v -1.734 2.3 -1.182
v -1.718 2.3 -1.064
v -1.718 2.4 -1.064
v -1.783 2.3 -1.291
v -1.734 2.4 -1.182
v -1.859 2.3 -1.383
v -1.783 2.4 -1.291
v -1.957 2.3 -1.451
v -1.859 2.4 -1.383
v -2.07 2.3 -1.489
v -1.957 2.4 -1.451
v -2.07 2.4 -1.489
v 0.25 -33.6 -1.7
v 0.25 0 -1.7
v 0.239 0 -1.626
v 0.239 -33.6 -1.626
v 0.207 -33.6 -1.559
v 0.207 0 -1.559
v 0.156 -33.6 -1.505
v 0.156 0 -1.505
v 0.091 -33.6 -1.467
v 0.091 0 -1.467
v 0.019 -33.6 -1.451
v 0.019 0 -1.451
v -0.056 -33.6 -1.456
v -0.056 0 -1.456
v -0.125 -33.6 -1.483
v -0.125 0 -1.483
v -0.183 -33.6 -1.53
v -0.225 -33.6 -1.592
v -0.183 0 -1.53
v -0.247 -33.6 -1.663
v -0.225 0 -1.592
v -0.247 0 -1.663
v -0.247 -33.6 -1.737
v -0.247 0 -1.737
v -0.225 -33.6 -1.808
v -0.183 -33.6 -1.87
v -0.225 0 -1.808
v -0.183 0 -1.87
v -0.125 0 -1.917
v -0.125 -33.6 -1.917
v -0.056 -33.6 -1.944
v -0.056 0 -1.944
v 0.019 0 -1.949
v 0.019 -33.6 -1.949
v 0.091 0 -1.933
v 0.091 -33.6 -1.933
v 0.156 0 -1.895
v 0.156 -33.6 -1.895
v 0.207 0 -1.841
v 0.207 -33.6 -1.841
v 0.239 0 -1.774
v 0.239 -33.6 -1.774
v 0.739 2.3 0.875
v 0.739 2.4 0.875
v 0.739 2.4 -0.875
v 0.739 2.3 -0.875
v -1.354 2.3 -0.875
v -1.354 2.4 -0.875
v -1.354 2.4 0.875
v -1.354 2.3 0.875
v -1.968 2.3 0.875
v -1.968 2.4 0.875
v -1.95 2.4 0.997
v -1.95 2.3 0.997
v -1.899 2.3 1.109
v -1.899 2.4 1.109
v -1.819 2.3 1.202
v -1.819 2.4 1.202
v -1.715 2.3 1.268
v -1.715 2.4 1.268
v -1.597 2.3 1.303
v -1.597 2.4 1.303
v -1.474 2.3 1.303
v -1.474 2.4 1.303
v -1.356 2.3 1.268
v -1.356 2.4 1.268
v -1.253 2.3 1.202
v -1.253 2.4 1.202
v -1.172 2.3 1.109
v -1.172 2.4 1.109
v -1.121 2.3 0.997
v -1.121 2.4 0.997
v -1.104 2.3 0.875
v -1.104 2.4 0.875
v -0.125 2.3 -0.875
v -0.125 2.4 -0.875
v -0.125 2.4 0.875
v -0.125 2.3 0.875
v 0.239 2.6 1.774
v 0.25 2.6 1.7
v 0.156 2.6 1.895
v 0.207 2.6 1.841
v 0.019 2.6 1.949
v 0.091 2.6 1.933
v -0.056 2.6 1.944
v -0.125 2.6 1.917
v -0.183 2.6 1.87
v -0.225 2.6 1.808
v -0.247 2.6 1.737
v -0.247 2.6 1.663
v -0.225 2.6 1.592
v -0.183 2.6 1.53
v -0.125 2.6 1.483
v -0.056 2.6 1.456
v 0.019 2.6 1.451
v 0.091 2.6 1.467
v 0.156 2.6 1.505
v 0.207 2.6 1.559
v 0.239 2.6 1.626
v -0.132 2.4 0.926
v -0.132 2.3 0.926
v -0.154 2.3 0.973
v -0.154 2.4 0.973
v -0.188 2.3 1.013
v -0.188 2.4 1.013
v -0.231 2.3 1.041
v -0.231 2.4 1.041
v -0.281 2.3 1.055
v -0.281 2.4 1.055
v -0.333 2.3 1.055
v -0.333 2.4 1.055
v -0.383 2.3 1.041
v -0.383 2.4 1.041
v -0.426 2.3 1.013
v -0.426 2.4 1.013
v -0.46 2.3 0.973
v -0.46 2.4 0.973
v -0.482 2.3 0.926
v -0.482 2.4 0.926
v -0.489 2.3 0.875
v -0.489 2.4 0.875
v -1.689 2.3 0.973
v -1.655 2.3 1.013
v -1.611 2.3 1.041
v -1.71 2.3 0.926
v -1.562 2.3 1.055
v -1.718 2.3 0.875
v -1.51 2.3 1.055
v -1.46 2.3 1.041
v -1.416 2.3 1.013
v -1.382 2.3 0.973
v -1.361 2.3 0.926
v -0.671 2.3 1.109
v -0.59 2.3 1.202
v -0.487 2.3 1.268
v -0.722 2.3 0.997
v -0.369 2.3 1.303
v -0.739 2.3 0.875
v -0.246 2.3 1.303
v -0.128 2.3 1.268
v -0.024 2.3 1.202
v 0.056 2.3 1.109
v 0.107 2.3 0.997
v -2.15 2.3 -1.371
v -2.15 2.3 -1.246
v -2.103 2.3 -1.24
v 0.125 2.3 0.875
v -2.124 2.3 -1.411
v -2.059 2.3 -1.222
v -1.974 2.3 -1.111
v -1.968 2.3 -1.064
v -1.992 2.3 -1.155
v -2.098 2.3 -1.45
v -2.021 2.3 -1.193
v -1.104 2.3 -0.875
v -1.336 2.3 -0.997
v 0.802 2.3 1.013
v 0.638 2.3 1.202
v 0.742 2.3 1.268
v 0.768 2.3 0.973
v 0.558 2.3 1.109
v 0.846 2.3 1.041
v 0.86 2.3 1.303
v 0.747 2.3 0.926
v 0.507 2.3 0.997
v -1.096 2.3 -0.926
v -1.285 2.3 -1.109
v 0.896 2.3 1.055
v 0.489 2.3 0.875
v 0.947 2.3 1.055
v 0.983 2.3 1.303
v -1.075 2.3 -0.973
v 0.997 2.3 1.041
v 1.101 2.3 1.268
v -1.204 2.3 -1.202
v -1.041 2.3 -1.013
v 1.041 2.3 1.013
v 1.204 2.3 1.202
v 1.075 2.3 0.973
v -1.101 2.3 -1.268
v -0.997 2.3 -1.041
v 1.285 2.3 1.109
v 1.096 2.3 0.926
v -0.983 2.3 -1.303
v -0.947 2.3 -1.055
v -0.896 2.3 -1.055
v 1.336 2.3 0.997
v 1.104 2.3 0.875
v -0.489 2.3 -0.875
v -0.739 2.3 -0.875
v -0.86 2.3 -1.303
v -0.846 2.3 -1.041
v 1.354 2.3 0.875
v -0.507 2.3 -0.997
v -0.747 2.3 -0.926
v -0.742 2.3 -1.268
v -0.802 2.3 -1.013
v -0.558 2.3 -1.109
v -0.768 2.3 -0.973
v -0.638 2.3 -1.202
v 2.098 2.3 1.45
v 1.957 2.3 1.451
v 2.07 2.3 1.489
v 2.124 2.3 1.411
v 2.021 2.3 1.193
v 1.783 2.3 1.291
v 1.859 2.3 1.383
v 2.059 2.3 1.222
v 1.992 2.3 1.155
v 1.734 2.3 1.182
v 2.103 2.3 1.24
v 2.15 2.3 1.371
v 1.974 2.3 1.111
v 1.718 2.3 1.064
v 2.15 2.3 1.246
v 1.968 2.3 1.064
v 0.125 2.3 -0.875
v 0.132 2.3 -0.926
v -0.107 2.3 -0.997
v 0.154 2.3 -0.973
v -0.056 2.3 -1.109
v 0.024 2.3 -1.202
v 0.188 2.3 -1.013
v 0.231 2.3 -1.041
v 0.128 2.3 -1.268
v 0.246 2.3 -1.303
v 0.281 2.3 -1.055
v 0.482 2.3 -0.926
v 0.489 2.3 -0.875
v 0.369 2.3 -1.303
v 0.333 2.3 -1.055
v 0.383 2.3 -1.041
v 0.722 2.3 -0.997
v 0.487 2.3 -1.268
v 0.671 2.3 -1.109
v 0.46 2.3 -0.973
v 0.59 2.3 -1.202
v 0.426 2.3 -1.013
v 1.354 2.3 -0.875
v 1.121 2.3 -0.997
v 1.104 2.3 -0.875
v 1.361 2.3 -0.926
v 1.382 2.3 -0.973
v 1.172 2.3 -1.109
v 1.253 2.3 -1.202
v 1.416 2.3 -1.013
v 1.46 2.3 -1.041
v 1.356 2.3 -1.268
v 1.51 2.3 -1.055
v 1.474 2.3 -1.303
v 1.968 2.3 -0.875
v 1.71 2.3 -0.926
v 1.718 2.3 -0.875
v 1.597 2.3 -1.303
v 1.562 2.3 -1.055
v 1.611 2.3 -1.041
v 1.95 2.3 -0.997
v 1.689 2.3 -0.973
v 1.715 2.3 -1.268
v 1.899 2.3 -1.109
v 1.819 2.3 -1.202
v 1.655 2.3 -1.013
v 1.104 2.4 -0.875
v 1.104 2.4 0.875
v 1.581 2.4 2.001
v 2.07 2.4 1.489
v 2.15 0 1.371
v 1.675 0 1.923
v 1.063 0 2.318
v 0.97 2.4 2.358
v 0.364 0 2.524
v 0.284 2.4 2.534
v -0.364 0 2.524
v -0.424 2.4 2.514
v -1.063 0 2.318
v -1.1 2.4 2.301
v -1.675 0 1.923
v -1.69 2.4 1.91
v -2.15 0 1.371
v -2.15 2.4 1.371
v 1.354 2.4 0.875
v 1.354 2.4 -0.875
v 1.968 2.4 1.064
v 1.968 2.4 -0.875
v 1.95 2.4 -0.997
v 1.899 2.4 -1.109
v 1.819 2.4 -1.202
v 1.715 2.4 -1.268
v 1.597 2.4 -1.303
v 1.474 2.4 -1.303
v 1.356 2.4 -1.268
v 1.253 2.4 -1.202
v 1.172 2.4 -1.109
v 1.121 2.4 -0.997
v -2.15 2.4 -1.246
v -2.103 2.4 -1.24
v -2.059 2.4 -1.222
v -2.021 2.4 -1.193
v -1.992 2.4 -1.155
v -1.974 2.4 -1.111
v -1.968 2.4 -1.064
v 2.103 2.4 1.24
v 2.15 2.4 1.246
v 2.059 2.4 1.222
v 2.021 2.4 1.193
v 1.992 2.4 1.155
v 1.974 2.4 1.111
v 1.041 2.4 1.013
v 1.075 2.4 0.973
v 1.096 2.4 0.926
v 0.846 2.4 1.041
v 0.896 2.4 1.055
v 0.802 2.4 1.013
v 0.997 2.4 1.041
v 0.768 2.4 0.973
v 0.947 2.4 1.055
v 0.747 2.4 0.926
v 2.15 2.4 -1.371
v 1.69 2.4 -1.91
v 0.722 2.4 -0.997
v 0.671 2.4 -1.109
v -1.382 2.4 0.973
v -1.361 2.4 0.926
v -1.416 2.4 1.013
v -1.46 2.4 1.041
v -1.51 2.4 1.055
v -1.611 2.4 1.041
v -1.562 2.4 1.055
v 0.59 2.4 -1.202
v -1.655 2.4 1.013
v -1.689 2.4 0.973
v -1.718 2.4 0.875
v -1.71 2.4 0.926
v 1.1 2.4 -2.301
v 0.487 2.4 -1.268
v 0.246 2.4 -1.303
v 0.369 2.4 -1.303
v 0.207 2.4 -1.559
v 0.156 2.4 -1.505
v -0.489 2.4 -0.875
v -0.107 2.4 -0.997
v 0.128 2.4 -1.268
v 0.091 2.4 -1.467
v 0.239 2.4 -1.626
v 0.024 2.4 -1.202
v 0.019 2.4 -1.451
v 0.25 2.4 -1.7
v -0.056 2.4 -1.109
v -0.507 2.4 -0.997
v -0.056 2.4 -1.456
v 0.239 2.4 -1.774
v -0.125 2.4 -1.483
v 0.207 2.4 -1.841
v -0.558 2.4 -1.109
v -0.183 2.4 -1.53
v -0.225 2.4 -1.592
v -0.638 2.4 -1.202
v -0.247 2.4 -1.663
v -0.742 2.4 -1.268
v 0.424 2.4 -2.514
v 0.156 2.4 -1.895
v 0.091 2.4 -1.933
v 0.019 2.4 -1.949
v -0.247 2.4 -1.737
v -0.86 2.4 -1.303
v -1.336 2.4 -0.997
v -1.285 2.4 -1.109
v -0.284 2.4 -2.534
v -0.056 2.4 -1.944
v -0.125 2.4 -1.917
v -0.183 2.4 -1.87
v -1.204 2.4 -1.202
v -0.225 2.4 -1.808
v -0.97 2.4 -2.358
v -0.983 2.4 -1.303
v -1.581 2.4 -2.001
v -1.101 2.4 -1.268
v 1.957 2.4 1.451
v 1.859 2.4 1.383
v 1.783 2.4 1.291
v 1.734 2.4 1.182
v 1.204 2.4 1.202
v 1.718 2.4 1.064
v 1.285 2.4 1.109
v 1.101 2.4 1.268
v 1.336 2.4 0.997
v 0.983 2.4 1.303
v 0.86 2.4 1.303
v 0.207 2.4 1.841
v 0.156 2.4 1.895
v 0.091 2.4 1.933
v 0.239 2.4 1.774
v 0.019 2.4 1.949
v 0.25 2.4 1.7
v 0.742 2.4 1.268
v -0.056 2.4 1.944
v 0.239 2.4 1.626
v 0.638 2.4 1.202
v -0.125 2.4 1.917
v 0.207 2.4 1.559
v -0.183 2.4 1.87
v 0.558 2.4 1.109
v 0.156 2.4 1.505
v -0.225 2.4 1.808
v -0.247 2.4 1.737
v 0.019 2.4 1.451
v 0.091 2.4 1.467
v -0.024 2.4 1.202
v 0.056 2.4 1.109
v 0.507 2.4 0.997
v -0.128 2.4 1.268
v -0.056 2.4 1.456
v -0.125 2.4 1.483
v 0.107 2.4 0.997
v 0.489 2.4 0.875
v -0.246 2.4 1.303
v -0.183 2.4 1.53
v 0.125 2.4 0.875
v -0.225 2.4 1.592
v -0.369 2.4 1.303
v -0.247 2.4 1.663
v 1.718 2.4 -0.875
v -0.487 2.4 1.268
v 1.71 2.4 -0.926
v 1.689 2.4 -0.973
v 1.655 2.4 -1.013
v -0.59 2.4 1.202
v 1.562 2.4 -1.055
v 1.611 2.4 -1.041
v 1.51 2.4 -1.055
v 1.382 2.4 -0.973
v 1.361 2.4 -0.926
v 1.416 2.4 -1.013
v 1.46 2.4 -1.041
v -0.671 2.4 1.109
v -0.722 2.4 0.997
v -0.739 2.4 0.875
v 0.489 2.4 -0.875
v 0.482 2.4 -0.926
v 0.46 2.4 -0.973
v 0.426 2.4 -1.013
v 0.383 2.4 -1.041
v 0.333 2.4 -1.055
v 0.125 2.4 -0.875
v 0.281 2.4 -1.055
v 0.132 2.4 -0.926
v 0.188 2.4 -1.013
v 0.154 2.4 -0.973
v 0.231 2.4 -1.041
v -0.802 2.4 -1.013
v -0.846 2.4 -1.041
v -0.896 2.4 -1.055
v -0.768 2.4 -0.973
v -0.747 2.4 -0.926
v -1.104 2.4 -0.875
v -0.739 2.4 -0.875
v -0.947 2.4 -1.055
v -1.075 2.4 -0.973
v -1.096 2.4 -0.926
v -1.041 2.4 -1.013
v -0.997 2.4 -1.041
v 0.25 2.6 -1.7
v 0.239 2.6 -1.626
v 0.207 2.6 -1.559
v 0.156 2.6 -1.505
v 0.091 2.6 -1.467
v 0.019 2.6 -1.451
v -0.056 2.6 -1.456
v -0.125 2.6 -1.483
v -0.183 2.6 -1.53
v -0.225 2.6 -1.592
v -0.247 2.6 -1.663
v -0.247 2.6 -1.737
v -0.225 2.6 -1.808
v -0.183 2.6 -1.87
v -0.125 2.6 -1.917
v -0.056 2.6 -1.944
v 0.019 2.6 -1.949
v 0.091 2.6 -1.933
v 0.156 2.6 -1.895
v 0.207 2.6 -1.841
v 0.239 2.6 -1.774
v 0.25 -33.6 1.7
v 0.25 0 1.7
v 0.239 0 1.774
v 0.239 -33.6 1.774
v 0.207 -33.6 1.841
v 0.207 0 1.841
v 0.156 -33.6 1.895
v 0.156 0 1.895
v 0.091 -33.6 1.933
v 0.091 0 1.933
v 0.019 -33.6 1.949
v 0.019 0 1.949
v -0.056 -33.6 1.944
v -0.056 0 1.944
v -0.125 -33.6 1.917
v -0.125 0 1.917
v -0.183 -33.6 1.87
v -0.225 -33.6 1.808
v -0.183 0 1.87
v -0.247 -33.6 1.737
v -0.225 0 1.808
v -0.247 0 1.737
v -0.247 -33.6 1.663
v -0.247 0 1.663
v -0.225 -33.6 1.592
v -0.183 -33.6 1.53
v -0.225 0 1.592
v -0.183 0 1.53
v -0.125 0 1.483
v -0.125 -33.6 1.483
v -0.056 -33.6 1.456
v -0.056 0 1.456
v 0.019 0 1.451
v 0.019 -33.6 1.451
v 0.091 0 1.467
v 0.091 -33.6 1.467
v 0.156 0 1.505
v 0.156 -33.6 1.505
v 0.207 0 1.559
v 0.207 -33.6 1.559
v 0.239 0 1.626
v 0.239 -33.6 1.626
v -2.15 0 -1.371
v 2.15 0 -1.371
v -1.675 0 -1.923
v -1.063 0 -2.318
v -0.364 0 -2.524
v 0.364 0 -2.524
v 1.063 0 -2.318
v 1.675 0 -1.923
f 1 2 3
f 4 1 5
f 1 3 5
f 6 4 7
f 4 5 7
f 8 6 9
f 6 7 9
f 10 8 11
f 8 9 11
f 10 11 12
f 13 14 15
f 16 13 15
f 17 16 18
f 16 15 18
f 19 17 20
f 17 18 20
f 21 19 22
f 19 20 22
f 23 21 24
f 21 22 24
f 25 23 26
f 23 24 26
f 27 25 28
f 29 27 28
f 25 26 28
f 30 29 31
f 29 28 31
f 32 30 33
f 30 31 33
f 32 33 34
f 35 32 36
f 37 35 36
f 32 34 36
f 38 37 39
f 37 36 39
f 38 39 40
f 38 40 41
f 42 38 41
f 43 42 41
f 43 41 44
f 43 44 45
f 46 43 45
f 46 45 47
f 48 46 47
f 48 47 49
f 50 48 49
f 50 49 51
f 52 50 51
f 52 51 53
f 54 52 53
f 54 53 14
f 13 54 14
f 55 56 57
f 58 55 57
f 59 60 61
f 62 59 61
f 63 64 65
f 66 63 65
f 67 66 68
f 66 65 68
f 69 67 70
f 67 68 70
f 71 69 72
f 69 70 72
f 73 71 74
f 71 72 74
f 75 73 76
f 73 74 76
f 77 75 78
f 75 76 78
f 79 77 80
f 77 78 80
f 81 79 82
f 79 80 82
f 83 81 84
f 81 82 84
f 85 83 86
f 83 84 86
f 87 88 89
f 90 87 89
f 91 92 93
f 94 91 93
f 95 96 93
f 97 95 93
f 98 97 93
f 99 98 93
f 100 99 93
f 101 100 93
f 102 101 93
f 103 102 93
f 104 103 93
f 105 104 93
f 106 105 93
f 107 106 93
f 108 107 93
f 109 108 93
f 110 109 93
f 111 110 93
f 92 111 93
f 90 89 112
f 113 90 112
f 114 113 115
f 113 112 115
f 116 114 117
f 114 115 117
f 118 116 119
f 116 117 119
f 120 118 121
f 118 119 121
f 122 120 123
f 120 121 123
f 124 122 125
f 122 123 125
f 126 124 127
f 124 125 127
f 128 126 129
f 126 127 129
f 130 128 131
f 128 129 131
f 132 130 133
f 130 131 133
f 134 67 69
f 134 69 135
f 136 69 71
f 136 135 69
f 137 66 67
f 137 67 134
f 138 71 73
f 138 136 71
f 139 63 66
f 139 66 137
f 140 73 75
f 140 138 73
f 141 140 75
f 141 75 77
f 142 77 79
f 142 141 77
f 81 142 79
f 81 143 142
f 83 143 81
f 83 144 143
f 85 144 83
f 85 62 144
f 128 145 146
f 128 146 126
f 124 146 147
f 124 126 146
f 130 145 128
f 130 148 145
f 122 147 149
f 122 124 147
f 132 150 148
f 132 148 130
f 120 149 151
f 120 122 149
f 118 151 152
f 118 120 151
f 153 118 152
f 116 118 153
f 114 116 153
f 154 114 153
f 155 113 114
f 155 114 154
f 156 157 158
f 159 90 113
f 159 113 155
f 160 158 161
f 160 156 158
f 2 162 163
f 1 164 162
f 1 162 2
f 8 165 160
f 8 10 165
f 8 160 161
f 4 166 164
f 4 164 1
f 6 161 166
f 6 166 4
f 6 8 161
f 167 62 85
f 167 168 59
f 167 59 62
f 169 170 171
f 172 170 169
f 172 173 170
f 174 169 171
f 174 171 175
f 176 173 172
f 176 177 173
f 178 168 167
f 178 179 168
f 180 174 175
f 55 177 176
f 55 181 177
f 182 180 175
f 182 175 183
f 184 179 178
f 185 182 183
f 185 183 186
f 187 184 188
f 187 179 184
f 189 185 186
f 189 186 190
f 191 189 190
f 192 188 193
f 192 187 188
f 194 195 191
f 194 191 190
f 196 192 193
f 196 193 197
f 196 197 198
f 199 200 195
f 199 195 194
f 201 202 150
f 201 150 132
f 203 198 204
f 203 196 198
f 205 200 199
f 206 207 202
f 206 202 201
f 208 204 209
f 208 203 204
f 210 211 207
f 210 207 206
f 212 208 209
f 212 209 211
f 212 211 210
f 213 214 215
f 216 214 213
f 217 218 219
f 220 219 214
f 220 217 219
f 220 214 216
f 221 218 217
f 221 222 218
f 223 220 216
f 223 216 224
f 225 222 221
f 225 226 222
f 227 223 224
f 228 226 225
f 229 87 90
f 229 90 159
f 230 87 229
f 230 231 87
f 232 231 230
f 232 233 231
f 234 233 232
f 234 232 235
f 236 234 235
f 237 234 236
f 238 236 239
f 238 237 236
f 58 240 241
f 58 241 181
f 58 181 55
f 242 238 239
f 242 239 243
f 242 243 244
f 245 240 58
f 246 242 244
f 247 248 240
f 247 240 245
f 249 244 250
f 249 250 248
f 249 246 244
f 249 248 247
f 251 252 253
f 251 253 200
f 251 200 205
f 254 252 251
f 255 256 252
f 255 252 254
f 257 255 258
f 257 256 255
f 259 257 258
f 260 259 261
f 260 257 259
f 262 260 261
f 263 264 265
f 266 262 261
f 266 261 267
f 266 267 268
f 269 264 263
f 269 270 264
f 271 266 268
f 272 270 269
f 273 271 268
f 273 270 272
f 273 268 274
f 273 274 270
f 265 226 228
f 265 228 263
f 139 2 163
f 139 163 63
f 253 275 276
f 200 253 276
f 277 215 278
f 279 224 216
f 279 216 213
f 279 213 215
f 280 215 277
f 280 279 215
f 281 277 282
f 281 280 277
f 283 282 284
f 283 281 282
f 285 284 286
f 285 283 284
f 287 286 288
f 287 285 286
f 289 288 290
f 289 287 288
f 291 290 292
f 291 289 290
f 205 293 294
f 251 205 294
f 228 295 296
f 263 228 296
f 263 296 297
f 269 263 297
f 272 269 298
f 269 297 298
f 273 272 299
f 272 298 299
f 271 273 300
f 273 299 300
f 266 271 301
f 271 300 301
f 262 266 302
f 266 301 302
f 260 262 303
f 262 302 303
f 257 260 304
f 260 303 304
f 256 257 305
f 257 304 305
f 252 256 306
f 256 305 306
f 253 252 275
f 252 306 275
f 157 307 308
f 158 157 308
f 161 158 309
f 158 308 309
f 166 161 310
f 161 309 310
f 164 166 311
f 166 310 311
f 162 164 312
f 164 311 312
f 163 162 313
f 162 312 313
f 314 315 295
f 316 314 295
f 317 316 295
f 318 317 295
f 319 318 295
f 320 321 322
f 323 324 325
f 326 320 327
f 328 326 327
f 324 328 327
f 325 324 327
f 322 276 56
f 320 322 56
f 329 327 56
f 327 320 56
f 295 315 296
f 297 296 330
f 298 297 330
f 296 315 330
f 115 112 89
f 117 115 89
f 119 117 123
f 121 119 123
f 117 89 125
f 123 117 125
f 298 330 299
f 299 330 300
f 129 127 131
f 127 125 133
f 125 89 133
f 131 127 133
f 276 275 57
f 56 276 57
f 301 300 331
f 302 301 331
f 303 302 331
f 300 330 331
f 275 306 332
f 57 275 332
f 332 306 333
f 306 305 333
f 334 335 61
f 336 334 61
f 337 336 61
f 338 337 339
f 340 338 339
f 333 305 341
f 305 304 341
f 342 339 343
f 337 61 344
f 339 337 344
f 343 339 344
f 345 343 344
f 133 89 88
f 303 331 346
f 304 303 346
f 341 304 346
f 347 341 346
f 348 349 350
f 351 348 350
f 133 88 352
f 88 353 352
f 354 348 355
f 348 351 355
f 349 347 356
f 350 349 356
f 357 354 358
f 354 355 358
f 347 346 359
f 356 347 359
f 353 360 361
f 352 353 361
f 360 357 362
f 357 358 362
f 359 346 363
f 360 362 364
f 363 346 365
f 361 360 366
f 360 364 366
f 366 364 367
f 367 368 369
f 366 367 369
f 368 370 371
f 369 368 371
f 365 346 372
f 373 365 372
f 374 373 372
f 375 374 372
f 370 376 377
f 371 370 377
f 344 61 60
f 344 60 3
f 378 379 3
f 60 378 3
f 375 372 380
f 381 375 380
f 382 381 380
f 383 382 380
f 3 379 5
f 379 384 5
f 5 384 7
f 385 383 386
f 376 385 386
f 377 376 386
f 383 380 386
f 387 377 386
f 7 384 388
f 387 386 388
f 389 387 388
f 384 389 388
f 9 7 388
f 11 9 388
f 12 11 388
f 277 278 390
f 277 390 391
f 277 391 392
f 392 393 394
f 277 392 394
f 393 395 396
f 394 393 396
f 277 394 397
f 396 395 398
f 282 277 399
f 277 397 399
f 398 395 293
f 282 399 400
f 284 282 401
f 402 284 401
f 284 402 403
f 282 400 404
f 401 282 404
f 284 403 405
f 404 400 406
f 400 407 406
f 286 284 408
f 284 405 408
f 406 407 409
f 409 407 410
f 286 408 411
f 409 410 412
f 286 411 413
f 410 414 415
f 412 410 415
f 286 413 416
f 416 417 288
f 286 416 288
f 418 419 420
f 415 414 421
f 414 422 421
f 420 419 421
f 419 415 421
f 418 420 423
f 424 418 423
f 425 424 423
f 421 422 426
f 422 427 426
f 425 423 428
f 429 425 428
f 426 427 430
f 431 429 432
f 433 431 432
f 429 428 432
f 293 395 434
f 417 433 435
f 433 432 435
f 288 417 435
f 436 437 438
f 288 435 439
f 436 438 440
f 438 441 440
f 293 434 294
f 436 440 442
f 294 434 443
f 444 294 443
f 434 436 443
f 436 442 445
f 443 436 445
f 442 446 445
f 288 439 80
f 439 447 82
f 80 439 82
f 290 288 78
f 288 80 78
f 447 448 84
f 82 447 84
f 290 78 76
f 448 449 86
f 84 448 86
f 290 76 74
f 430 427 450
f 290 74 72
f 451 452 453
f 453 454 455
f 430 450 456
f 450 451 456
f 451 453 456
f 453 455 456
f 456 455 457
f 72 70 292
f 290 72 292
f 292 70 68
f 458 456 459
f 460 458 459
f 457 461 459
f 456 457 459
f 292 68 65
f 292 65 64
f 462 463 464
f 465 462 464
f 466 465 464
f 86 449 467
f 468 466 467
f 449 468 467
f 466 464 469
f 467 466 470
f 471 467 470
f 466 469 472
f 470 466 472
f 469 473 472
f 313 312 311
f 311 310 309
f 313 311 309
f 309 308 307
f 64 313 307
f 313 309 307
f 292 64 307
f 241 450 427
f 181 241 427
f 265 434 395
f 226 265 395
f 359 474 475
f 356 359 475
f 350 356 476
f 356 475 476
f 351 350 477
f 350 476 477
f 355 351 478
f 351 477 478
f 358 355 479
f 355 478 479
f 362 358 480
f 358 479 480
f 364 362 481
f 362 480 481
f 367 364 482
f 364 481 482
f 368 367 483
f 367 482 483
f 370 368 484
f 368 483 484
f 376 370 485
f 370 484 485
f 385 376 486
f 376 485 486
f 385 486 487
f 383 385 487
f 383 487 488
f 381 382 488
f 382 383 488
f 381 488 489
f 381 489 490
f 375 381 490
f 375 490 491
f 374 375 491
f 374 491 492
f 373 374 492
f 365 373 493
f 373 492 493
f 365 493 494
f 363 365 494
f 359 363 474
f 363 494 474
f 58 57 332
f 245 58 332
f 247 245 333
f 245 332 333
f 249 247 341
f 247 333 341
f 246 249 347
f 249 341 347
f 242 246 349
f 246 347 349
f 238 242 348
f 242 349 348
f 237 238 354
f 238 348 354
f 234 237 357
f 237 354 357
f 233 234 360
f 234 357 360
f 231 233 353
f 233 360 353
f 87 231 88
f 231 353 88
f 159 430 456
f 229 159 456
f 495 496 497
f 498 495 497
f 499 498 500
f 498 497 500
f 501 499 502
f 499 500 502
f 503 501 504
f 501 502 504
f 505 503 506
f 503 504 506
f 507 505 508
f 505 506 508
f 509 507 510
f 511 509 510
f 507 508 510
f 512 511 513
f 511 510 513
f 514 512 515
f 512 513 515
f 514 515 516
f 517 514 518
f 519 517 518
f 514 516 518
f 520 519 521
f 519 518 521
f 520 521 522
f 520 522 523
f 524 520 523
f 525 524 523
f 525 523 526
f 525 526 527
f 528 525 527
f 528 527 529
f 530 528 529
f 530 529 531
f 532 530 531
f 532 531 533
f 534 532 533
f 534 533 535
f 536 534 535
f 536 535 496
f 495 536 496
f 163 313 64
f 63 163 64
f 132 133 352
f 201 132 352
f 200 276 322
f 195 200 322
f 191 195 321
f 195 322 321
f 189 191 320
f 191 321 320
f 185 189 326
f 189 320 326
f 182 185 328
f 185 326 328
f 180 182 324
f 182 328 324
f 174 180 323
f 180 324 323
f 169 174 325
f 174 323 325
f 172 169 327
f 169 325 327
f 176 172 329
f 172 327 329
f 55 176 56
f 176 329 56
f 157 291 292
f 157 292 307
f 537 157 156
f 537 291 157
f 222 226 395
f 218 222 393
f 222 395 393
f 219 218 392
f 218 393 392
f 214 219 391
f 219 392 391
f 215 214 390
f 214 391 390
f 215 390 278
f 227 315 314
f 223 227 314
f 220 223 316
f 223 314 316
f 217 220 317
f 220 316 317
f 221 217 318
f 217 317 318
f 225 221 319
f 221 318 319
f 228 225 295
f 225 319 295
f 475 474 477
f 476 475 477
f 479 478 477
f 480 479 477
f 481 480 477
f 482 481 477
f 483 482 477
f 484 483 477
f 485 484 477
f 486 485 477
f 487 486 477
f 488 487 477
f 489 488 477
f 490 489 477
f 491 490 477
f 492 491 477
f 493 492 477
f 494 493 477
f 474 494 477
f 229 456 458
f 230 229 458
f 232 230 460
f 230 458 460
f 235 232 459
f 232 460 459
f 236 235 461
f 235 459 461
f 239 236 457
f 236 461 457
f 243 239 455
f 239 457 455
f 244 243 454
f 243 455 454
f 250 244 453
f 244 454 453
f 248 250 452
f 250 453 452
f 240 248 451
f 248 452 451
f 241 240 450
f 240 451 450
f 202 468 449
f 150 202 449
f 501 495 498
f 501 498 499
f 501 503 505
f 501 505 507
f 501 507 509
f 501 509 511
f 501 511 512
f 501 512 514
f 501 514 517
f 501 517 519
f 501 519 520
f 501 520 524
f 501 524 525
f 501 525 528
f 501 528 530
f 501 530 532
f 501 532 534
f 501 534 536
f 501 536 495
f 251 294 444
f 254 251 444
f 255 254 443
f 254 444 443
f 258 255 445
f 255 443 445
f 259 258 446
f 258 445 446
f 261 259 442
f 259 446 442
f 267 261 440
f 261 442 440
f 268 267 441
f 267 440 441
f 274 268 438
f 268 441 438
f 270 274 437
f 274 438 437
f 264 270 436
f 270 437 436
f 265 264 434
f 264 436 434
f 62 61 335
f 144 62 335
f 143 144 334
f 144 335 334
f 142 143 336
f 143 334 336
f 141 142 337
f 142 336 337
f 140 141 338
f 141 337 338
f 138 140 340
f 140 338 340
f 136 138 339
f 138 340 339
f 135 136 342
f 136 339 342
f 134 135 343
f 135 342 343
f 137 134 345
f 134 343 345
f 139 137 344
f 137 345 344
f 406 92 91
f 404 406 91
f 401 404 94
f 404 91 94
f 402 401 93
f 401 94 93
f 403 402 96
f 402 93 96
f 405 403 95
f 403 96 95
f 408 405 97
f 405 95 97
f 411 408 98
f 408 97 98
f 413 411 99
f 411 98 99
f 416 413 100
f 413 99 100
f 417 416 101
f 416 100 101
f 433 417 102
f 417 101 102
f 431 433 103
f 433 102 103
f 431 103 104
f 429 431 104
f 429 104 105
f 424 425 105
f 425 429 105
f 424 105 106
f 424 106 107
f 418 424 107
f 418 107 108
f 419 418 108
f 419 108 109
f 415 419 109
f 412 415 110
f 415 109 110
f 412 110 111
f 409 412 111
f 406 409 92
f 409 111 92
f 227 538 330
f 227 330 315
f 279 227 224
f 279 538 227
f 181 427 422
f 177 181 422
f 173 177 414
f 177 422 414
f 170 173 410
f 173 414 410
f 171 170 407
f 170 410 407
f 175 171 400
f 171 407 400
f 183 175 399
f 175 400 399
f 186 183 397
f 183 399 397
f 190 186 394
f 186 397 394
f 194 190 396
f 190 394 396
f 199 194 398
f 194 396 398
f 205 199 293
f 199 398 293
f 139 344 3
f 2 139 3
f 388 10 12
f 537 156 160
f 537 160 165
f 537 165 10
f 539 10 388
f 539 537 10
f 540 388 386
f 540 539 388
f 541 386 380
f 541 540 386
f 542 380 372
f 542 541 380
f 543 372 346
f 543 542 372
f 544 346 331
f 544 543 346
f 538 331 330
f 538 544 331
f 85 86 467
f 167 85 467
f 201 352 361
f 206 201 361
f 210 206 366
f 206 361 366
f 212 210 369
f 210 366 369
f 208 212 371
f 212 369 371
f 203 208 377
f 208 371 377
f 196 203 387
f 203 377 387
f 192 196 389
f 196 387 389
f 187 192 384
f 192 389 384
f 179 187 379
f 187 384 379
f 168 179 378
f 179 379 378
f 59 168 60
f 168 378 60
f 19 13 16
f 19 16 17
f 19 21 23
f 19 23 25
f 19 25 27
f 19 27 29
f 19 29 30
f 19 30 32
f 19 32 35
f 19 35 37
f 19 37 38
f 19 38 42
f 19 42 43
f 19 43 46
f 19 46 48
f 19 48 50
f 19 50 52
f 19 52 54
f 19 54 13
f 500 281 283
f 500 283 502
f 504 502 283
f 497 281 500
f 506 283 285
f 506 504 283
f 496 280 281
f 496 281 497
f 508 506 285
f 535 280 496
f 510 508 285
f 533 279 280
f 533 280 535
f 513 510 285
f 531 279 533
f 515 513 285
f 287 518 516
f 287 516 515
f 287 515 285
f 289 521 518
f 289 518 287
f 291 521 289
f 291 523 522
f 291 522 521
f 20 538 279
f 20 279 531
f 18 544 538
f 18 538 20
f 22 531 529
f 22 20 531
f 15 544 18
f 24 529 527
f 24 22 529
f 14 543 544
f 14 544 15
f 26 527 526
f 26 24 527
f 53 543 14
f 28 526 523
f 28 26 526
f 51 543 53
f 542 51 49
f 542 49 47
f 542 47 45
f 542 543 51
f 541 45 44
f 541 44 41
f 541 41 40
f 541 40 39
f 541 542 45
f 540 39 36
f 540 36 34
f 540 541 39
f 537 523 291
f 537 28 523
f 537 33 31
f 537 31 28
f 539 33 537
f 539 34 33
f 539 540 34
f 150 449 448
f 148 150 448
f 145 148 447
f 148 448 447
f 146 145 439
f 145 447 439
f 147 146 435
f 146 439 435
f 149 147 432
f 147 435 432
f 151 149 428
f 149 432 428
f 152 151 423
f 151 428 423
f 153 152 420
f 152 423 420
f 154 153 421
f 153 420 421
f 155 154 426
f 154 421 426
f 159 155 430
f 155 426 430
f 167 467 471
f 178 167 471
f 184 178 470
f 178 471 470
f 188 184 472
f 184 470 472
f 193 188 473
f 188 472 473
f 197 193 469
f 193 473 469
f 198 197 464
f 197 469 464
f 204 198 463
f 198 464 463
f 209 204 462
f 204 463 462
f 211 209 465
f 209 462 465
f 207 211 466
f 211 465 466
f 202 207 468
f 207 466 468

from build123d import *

# Parameters (mm, degrees)
BOSS_EXTRUDE1_DEPTH     = 2.4
BOSS_EXTRUDE2_START     = -2.6
SKETCH2_R               = 0.25
BOSS_EXTRUDE2_DEPTH     = 36.2
CUT_EXTRUDE_THIN1_DEPTH = 0.1


with BuildPart() as part:
    # Sketch1 → Boss-Extrude1 (new body)
    with BuildSketch(Plane(origin=(0, 0, 0), x_dir=(1, 0, 0), z_dir=(0, 1, 0))):
        with BuildLine():
            Line((2.15, 1.37113092), (2.15, -1.37113092))
            ThreePointArc((2.15, -1.37113092), (0, -2.55), (-2.15, -1.37113092))
            Line((-2.15, -1.37113092), (-2.15, 1.37113092))
            ThreePointArc((-2.15, 1.37113092), (0, 2.55), (2.15, 1.37113092))
        make_face()
    extrude(amount=BOSS_EXTRUDE1_DEPTH)

    # Sketch2 → Boss-Extrude2 (add)
    with BuildSketch(Plane.XZ.offset(BOSS_EXTRUDE2_START)):
        with Locations((0, 1.7)):
            Circle(SKETCH2_R)
        with Locations((0, -1.7)):
            Circle(SKETCH2_R)
    extrude(amount=BOSS_EXTRUDE2_DEPTH)

    # Sketch3 → Cut-Extrude-Thin1 (cut)
    with BuildSketch(Plane(origin=(0, 2.4, 0), x_dir=(1, 0, 0), z_dir=(0, 1, 0))):
        with BuildLine():
            ThreePointArc((-2.15, 1.24613092), (-2.021205551, 1.192782512), (-1.967857143, 1.063988063))
            Line((-1.967857143, 1.063988063), (-1.967857143, -0.875))
            ThreePointArc((-1.967857143, -0.875), (-1.535714286, -1.307142857), (-1.103571429, -0.875))
            Line((-1.103571429, -0.875), (-1.103571429, 0.875))
            ThreePointArc((-1.103571429, 0.875), (-0.921428571, 1.057142857), (-0.739285714, 0.875))
            Line((-0.739285714, 0.875), (-0.739285714, -0.875))
            ThreePointArc((-0.739285714, -0.875), (-0.307142857, -1.307142857), (0.125, -0.875))
            Line((0.125, -0.875), (0.125, 0.875))
            ThreePointArc((0.125, 0.875), (0.307142857, 1.057142857), (0.489285714, 0.875))
            Line((0.489285714, 0.875), (0.489285714, -0.875))
            ThreePointArc((0.489285714, -0.875), (0.921428571, -1.307142857), (1.353571429, -0.875))
            Line((1.353571429, -0.875), (1.353571429, 0.875))
            ThreePointArc((1.353571429, 0.875), (1.535714286, 1.057142857), (1.717857143, 0.875))
            Line((1.717857143, 0.875), (1.717857143, -1.063988063))
            ThreePointArc((1.717857143, -1.063988063), (1.844428855, -1.369559208), (2.15, -1.49613092))
            Line((2.15, -1.49613092), (2.15, -1.24613092))
            ThreePointArc((2.15, -1.24613092), (2.021205551, -1.192782512), (1.967857143, -1.063988063))
            Line((1.967857143, -1.063988063), (1.967857143, 0.875))
            ThreePointArc((1.967857143, 0.875), (1.535714286, 1.307142857), (1.103571429, 0.875))
            Line((1.103571429, 0.875), (1.103571429, -0.875))
            ThreePointArc((1.103571429, -0.875), (0.921428571, -1.057142857), (0.739285714, -0.875))
            Line((0.739285714, -0.875), (0.739285714, 0.875))
            ThreePointArc((0.739285714, 0.875), (0.307142857, 1.307142857), (-0.125, 0.875))
            Line((-0.125, 0.875), (-0.125, -0.875))
            ThreePointArc((-0.125, -0.875), (-0.307142857, -1.057142857), (-0.489285714, -0.875))
            Line((-0.489285714, -0.875), (-0.489285714, 0.875))
            ThreePointArc((-0.489285714, 0.875), (-0.921428571, 1.307142857), (-1.353571429, 0.875))
            Line((-1.353571429, 0.875), (-1.353571429, -0.875))
            ThreePointArc((-1.353571429, -0.875), (-1.535714286, -1.057142857), (-1.717857143, -0.875))
            Line((-1.717857143, -0.875), (-1.717857143, 1.063988063))
            ThreePointArc((-1.717857143, 1.063988063), (-1.844428855, 1.369559208), (-2.15, 1.49613092))
            Line((-2.15, 1.49613092), (-2.15, 1.24613092))
        make_face()
    extrude(amount=-CUT_EXTRUDE_THIN1_DEPTH, mode=Mode.SUBTRACT)


solid = part.part
